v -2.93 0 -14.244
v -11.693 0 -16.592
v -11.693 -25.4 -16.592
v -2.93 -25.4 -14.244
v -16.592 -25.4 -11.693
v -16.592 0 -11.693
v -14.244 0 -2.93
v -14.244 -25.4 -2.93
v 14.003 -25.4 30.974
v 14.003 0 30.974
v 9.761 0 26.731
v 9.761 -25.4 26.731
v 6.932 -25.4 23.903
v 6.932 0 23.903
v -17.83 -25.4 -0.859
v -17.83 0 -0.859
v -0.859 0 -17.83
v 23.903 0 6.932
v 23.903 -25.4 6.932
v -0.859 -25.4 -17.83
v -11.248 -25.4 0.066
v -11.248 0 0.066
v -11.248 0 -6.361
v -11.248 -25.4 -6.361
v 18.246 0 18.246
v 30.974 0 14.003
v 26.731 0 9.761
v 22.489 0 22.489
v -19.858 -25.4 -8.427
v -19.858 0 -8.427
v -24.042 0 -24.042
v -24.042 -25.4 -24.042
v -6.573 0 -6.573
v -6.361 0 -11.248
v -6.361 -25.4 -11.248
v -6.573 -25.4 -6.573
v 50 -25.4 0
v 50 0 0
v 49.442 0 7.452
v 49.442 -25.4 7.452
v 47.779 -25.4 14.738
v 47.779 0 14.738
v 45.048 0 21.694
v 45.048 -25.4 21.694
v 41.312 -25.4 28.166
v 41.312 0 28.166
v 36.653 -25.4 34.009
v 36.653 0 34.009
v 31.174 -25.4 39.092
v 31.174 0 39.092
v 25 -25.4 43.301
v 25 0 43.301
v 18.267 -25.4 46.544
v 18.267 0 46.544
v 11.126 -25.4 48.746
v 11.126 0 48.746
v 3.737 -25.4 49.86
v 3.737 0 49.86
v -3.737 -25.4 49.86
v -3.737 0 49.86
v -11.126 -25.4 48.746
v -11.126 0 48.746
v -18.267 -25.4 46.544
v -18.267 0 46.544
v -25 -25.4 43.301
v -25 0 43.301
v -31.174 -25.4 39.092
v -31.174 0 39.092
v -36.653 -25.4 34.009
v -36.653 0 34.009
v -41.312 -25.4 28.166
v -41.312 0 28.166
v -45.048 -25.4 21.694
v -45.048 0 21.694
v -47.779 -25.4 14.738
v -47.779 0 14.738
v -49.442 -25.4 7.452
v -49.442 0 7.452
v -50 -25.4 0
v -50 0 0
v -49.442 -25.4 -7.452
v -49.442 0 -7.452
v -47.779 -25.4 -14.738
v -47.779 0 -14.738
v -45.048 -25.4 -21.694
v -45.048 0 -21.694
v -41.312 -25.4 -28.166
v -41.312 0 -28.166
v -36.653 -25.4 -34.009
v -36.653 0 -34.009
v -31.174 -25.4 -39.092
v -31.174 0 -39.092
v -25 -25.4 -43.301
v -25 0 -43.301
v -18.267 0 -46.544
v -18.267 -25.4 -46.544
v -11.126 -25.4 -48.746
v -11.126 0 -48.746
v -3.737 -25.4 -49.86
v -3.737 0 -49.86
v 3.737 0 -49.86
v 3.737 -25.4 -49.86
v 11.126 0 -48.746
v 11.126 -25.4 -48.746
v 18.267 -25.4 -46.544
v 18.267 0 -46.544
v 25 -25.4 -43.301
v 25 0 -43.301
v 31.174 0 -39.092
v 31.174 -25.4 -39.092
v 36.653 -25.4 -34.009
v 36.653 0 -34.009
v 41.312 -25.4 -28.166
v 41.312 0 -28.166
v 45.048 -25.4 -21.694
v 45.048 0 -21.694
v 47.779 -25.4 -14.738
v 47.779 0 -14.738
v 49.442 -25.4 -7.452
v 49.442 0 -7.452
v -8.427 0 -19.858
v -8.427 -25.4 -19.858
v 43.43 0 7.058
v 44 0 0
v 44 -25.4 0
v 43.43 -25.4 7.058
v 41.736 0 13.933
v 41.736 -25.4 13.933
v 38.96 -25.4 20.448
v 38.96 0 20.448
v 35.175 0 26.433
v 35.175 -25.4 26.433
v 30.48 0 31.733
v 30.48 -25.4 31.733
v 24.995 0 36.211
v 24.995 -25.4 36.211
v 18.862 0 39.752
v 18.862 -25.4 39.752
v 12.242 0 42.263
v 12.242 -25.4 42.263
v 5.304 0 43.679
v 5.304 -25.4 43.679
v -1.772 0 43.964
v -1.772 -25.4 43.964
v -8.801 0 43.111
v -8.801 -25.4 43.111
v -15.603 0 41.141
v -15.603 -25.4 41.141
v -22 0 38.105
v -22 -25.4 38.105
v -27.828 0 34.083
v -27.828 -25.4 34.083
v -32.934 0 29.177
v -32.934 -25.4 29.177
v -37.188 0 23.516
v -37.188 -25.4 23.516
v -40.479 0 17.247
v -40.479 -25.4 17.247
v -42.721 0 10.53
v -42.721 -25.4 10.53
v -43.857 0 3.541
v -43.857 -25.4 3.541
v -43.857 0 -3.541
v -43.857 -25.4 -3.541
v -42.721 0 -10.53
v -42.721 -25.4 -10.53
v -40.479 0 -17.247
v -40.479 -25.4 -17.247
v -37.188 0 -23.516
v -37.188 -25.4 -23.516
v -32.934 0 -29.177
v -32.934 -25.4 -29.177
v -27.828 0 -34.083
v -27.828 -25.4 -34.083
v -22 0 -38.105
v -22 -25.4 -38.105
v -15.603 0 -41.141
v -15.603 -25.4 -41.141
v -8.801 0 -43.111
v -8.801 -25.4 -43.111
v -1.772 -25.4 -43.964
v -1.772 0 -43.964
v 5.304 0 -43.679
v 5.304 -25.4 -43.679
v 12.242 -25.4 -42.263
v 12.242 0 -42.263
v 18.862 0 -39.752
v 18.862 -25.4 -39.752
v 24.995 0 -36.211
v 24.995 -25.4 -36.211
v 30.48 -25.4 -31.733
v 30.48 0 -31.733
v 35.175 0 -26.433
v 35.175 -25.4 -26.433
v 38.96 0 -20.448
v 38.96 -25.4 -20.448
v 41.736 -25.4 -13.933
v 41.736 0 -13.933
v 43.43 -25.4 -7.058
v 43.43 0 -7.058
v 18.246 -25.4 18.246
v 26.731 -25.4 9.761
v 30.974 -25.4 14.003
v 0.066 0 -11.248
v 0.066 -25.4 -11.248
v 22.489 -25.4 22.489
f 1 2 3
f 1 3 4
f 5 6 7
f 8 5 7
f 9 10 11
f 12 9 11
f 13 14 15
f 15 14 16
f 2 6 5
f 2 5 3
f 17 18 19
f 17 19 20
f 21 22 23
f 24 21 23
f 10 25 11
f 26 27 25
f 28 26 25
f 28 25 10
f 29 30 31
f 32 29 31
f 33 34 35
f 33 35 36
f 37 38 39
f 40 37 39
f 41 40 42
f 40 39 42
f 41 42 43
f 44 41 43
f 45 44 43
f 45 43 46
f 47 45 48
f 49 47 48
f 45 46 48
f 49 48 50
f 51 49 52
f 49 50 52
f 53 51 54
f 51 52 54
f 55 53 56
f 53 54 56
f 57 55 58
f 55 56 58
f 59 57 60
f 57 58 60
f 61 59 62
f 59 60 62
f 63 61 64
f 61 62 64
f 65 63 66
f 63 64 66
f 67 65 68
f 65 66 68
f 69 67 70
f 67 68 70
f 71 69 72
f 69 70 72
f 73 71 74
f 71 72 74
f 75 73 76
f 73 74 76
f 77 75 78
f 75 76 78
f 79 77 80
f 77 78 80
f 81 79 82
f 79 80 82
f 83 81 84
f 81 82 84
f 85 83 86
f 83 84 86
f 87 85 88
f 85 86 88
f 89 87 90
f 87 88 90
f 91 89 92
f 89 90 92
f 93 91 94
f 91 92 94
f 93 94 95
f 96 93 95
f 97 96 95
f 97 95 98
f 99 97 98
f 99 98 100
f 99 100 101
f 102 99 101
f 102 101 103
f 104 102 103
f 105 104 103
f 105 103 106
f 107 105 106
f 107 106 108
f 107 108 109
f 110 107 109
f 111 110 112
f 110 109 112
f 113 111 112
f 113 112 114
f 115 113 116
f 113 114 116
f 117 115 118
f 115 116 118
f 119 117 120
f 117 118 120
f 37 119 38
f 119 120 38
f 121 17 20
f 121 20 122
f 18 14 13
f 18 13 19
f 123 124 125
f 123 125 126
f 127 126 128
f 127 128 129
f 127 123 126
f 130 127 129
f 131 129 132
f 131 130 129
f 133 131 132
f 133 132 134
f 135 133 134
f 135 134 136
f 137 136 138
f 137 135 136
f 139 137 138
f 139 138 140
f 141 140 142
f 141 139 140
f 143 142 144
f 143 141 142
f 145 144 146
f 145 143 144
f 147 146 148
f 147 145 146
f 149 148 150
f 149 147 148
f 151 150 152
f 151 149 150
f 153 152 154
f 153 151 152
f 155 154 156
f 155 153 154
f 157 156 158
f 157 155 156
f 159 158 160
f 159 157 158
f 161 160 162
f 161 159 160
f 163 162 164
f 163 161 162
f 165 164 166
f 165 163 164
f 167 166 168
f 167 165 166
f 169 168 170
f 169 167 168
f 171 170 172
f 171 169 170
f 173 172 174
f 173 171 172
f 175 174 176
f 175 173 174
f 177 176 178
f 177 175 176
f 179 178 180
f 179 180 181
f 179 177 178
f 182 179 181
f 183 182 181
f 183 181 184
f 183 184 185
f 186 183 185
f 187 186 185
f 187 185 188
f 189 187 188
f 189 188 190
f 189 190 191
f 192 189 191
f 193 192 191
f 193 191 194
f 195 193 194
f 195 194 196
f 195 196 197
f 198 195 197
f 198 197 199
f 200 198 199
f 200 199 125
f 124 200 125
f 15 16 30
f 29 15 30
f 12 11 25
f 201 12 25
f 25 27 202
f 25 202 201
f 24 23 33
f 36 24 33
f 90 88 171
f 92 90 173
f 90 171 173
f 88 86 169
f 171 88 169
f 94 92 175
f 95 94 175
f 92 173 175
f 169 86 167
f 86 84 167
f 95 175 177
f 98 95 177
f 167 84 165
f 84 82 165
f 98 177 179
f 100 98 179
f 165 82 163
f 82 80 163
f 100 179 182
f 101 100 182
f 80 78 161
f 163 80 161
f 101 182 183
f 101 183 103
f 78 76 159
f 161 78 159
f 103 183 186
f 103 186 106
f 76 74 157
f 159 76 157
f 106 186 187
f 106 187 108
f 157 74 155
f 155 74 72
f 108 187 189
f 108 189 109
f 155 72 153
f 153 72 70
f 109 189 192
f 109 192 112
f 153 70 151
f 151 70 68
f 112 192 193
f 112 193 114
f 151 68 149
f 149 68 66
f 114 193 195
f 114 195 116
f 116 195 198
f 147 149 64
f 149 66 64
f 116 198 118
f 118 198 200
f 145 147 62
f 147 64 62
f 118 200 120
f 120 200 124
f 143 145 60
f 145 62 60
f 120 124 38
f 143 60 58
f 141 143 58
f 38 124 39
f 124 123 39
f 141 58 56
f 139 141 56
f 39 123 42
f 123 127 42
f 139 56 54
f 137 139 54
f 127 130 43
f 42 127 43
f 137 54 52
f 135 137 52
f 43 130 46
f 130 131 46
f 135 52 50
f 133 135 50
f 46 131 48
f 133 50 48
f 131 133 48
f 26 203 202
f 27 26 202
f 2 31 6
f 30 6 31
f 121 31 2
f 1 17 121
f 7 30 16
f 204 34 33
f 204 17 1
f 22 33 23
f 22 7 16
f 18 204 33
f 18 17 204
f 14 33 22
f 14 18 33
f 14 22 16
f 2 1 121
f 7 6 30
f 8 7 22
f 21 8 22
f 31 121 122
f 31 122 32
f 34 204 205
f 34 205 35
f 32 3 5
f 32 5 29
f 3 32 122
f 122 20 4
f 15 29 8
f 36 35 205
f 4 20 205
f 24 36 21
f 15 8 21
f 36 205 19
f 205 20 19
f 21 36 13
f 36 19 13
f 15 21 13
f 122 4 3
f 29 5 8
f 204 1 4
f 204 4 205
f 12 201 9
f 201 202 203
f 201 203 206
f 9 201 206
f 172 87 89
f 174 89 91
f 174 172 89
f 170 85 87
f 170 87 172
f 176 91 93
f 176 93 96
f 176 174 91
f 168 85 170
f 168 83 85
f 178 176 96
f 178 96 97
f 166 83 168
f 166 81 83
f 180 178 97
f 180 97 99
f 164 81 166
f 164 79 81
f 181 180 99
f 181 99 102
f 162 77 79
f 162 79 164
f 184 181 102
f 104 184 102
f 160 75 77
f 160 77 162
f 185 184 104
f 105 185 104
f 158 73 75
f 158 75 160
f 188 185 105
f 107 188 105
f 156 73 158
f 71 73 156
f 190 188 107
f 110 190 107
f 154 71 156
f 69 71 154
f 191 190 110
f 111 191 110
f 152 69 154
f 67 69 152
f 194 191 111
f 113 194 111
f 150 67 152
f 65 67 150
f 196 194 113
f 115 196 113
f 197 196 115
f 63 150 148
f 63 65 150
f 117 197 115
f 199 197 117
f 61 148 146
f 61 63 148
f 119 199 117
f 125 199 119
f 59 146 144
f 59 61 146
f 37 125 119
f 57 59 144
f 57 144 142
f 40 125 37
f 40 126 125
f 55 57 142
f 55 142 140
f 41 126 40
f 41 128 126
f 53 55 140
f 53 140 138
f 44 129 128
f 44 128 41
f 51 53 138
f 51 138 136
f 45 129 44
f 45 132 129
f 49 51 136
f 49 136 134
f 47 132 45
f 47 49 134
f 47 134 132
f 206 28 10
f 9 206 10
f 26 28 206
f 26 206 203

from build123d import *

# Parameters (mm, degrees)
F0_R     = 50
F0_R_2   = 44
F1_DEPTH = 25.4
F2_DEPTH = 25.4


# Not quite as in the source:
# - a feature names something its author has since deleted; it is built from what else it names


with BuildPart() as f1:
    # F0 (on Front) → F1 (new body)
    with BuildSketch(Plane.XZ):
        Circle(F0_R)
        Circle(F0_R_2, mode=Mode.SUBTRACT)
    extrude(amount=F1_DEPTH)


with BuildPart() as f2:
    # F0 (on Front) → F2 (new body)
    with BuildSketch(Plane.XZ):
        Polygon((-24.0416305603, -24.0416305603), (-18.3847763109, -18.3847763109), (-16.5916253665, -11.6926458809), (-19.8576116902, -8.4266595572), align=None)
        Polygon((-18.3847763109, -18.3847763109), (-14.1421356237, -14.1421356237), (-16.5916253665, -11.6926458809), align=None)
        Polygon((-11.2475056175, 0.0662028815), (9.7607779651, 21.0744864641), (6.9323508404, 23.9029135888), (-17.8299734779, -0.8594107294), (-19.8576116902, -8.4266595572), (-16.5916253665, -11.6926458809), (-14.2436715892, -2.9299630902), align=None)
        Polygon((-6.5731576178, -6.5731576178), (0, 0), (15.4176322146, 15.4176322146), (9.7607779651, 21.0744864641), (-11.2475056175, 0.0662028815), (-11.2475056175, -6.3611790538), align=None)
    extrude(amount=F2_DEPTH)

    # F3: F2 across face


with BuildPart() as f2b:
    # F0 (on Front) → F2, piece 2 (new body)
    with BuildSketch(Plane.XZ):
        Polygon((14.0034186522, 30.9739814007), (9.7607779651, 26.7313407136), (18.2460593393, 18.2460593393), (22.4887000265, 22.4887000265), align=None)
    extrude(amount=F2_DEPTH)

    # F4: F2b across face


with BuildPart() as f2_1:
    add(f2.part)
    add(f2.part.mirror(Plane(origin=(4.4222372984, -12.7, 4.4222372984), x_dir=(0, 1, 0), z_dir=(0.7071067812, 0, -0.7071067812))))


with BuildPart() as f2b_1:
    add(f2b.part)
    add(f2b.part.mirror(Plane(origin=(20.3673796829, -12.7, 20.3673796829), x_dir=(0, 1, 0), z_dir=(0.7071067812, 0, -0.7071067812))))


solid = Compound([f1.part, f2_1.part, f2b_1.part])
